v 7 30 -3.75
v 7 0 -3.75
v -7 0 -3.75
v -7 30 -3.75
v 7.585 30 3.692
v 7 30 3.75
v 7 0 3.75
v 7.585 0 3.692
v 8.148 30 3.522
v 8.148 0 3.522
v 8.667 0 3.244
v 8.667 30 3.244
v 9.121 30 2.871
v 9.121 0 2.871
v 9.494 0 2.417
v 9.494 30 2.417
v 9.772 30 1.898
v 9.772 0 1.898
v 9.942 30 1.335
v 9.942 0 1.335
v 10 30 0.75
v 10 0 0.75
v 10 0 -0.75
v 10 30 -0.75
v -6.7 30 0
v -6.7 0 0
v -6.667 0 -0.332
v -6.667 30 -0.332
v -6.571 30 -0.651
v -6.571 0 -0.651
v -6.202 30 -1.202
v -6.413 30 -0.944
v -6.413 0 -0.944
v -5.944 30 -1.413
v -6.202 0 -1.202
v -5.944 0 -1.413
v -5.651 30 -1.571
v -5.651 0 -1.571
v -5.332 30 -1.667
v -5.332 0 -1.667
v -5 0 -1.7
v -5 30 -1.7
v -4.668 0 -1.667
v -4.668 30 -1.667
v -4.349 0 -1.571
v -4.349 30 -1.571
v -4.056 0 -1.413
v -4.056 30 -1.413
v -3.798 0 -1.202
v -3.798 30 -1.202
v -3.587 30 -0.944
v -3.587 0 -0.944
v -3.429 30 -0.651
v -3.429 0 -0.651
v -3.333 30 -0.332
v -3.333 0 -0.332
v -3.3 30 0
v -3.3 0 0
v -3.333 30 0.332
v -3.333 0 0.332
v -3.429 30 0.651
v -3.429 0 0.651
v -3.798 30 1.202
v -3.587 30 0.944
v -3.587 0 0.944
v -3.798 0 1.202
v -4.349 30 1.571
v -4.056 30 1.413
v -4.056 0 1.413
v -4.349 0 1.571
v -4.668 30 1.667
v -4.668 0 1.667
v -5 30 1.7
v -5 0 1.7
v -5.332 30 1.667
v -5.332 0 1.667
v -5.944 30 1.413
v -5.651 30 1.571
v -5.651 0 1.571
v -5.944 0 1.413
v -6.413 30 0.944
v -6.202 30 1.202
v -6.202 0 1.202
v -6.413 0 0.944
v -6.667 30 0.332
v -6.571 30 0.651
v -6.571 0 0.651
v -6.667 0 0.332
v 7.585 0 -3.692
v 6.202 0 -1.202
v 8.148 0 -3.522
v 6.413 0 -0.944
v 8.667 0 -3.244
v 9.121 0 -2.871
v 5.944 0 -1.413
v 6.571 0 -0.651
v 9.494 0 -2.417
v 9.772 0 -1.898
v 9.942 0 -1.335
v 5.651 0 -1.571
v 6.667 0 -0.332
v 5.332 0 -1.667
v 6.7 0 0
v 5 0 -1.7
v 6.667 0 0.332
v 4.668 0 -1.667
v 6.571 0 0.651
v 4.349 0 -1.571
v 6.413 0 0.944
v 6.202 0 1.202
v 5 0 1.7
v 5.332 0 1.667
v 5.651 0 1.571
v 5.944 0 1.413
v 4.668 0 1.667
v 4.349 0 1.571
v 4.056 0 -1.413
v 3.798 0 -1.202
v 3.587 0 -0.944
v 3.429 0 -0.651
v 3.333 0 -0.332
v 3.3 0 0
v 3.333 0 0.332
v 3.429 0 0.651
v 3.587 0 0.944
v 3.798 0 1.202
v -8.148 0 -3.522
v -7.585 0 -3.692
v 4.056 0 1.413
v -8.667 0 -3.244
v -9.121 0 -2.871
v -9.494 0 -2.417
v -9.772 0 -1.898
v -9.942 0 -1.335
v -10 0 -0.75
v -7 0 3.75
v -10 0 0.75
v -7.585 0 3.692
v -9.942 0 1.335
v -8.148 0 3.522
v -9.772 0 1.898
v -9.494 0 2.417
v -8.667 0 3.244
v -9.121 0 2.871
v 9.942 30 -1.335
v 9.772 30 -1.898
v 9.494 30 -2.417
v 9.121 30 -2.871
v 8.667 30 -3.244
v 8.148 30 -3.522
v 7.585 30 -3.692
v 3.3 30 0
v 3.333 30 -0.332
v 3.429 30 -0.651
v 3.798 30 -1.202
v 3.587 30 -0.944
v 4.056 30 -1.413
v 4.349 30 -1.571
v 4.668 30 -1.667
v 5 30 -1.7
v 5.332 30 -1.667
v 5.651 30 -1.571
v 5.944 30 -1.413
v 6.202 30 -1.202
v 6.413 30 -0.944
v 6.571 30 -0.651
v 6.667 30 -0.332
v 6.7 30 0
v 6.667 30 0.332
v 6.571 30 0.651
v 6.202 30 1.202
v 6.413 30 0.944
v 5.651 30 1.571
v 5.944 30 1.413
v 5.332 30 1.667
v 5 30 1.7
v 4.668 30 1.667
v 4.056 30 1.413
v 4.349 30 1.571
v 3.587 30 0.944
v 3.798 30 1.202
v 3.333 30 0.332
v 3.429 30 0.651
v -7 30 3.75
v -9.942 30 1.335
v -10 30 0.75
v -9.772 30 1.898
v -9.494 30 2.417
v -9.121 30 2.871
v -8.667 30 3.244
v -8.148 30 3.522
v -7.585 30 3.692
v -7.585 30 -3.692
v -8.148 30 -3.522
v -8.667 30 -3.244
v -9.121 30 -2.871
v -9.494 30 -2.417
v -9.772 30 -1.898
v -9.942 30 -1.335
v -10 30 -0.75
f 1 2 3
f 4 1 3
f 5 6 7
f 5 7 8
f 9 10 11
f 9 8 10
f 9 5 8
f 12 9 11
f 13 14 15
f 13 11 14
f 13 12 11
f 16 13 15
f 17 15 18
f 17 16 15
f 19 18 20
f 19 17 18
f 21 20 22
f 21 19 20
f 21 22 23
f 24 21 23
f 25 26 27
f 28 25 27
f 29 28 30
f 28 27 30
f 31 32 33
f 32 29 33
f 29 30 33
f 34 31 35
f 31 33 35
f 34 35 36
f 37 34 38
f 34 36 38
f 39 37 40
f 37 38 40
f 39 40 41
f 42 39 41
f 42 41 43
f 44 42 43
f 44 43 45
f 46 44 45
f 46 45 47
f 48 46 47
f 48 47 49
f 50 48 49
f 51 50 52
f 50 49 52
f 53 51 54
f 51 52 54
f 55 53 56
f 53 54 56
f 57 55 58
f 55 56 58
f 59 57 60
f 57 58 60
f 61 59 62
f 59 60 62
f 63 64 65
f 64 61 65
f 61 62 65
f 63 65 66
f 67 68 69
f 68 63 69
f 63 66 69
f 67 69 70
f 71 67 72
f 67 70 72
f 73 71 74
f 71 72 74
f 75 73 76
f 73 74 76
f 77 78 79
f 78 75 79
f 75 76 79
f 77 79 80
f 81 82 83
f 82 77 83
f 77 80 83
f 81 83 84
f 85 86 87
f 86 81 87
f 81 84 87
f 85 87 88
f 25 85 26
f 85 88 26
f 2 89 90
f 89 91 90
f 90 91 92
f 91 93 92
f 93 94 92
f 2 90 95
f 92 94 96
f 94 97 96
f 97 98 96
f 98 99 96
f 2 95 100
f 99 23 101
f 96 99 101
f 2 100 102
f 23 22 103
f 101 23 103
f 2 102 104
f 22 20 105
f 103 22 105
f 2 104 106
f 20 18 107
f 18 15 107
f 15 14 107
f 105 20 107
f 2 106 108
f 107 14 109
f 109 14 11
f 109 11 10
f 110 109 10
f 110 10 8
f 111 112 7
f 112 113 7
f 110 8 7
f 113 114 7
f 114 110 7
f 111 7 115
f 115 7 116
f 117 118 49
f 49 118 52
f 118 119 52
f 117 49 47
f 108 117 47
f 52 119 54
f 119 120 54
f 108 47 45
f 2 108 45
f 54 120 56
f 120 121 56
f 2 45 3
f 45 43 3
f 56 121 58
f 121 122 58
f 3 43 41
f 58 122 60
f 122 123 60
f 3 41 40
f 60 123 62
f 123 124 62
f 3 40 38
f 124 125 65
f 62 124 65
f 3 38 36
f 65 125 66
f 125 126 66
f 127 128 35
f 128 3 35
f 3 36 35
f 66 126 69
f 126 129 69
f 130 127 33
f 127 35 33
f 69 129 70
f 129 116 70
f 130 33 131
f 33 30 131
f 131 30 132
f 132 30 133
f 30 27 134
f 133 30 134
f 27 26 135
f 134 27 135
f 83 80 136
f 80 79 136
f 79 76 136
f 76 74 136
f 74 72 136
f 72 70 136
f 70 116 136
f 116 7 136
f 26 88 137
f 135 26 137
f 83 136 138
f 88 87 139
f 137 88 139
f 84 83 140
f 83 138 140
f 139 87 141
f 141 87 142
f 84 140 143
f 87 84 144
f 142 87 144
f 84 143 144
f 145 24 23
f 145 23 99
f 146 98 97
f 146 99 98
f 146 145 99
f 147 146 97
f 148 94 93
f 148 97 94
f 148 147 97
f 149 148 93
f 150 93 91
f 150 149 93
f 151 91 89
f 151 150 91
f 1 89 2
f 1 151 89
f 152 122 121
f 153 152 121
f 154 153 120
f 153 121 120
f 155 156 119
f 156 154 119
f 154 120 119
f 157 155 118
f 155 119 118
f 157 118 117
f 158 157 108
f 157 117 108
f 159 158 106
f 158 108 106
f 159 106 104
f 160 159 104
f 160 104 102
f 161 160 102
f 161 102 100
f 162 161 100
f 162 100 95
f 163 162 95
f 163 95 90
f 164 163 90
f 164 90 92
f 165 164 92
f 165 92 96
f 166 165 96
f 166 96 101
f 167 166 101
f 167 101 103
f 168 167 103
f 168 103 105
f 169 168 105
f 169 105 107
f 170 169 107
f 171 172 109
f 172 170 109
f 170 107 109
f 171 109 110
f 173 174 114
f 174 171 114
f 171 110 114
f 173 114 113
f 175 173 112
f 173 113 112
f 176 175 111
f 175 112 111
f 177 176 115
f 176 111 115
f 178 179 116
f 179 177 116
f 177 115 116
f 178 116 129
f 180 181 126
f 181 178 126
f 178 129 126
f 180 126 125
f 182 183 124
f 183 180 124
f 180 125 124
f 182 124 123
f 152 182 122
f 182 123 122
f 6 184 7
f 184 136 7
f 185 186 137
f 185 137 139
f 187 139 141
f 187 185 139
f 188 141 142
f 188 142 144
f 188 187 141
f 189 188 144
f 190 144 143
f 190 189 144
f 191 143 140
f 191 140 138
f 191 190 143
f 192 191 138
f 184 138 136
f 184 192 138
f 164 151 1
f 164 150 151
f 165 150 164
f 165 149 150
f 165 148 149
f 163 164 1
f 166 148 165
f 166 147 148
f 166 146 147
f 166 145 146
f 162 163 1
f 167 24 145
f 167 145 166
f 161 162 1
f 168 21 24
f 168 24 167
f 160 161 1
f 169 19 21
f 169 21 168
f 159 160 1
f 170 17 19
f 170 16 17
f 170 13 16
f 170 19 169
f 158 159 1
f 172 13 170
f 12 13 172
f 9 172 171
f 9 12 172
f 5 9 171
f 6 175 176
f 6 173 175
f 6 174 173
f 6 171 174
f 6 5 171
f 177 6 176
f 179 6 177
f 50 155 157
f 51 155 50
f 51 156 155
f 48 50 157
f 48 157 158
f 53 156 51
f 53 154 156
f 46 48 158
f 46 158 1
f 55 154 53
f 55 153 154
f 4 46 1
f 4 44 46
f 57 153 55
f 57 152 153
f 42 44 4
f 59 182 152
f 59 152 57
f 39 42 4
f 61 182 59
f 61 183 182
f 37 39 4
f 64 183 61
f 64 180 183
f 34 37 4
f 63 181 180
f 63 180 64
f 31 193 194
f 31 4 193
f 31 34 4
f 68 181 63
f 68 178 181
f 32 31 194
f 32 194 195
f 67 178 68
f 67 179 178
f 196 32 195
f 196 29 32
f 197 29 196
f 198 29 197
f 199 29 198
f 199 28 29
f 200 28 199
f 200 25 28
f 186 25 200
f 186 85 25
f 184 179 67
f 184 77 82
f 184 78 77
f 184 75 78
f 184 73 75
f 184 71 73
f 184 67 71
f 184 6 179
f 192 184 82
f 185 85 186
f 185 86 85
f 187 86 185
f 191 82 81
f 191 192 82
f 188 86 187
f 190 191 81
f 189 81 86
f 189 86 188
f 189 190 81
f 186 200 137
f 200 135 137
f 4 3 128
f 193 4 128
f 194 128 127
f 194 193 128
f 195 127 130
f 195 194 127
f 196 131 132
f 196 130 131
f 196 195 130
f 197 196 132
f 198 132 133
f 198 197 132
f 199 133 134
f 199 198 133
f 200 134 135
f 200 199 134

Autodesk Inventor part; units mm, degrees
ref_plane "YZ Plane" through (0, 0, 0) normal (1, 0, 0) x (0, 1, 0)
ref_plane "XZ Plane" through (0, 0, 0) normal (0, 1, 0) x (-1, 0, 0)
ref_plane "XY Plane" through (0, 0, 0) normal (0, 0, 1) x (1, 0, 0)
sketch "Sketch1" plane through (0, 0, 0) normal (0, 1, 0) x (-1, 0, 0)
  line L0 (10, 3.75) -> (-10, 3.75)
  line L1 (-10, 3.75) -> (-10, -3.75)
  line L2 (-10, -3.75) -> (10, -3.75)
  line L3 (10, -3.75) -> (10, 3.75)
  line L4 (10, 3.75) -> (-10, -3.75) construction
  line L5 (-10, 3.75) -> (10, -3.75) construction
  circle A0 centre (5, 0) radius 1.7
  circle A1 centre (-5, 0) radius 1.7
  point P0 (0, 0)
  dimension "d0" = 20
  dimension "d1" = 7.5
  dimension "d2" = 3.4
  dimension "d3" = 3.4
  dimension "d4" = 5
  dimension "d5" = 5
extrude "Extrusion1" add sketch "Sketch1" along normal blind 30
fillet "Fillet1" radius 3 4 edges at (10, 15, 3.75) (10, 15, -3.75) (-10, 15, -3.75) (-10, 15, 3.75)
properties part number "b1"
